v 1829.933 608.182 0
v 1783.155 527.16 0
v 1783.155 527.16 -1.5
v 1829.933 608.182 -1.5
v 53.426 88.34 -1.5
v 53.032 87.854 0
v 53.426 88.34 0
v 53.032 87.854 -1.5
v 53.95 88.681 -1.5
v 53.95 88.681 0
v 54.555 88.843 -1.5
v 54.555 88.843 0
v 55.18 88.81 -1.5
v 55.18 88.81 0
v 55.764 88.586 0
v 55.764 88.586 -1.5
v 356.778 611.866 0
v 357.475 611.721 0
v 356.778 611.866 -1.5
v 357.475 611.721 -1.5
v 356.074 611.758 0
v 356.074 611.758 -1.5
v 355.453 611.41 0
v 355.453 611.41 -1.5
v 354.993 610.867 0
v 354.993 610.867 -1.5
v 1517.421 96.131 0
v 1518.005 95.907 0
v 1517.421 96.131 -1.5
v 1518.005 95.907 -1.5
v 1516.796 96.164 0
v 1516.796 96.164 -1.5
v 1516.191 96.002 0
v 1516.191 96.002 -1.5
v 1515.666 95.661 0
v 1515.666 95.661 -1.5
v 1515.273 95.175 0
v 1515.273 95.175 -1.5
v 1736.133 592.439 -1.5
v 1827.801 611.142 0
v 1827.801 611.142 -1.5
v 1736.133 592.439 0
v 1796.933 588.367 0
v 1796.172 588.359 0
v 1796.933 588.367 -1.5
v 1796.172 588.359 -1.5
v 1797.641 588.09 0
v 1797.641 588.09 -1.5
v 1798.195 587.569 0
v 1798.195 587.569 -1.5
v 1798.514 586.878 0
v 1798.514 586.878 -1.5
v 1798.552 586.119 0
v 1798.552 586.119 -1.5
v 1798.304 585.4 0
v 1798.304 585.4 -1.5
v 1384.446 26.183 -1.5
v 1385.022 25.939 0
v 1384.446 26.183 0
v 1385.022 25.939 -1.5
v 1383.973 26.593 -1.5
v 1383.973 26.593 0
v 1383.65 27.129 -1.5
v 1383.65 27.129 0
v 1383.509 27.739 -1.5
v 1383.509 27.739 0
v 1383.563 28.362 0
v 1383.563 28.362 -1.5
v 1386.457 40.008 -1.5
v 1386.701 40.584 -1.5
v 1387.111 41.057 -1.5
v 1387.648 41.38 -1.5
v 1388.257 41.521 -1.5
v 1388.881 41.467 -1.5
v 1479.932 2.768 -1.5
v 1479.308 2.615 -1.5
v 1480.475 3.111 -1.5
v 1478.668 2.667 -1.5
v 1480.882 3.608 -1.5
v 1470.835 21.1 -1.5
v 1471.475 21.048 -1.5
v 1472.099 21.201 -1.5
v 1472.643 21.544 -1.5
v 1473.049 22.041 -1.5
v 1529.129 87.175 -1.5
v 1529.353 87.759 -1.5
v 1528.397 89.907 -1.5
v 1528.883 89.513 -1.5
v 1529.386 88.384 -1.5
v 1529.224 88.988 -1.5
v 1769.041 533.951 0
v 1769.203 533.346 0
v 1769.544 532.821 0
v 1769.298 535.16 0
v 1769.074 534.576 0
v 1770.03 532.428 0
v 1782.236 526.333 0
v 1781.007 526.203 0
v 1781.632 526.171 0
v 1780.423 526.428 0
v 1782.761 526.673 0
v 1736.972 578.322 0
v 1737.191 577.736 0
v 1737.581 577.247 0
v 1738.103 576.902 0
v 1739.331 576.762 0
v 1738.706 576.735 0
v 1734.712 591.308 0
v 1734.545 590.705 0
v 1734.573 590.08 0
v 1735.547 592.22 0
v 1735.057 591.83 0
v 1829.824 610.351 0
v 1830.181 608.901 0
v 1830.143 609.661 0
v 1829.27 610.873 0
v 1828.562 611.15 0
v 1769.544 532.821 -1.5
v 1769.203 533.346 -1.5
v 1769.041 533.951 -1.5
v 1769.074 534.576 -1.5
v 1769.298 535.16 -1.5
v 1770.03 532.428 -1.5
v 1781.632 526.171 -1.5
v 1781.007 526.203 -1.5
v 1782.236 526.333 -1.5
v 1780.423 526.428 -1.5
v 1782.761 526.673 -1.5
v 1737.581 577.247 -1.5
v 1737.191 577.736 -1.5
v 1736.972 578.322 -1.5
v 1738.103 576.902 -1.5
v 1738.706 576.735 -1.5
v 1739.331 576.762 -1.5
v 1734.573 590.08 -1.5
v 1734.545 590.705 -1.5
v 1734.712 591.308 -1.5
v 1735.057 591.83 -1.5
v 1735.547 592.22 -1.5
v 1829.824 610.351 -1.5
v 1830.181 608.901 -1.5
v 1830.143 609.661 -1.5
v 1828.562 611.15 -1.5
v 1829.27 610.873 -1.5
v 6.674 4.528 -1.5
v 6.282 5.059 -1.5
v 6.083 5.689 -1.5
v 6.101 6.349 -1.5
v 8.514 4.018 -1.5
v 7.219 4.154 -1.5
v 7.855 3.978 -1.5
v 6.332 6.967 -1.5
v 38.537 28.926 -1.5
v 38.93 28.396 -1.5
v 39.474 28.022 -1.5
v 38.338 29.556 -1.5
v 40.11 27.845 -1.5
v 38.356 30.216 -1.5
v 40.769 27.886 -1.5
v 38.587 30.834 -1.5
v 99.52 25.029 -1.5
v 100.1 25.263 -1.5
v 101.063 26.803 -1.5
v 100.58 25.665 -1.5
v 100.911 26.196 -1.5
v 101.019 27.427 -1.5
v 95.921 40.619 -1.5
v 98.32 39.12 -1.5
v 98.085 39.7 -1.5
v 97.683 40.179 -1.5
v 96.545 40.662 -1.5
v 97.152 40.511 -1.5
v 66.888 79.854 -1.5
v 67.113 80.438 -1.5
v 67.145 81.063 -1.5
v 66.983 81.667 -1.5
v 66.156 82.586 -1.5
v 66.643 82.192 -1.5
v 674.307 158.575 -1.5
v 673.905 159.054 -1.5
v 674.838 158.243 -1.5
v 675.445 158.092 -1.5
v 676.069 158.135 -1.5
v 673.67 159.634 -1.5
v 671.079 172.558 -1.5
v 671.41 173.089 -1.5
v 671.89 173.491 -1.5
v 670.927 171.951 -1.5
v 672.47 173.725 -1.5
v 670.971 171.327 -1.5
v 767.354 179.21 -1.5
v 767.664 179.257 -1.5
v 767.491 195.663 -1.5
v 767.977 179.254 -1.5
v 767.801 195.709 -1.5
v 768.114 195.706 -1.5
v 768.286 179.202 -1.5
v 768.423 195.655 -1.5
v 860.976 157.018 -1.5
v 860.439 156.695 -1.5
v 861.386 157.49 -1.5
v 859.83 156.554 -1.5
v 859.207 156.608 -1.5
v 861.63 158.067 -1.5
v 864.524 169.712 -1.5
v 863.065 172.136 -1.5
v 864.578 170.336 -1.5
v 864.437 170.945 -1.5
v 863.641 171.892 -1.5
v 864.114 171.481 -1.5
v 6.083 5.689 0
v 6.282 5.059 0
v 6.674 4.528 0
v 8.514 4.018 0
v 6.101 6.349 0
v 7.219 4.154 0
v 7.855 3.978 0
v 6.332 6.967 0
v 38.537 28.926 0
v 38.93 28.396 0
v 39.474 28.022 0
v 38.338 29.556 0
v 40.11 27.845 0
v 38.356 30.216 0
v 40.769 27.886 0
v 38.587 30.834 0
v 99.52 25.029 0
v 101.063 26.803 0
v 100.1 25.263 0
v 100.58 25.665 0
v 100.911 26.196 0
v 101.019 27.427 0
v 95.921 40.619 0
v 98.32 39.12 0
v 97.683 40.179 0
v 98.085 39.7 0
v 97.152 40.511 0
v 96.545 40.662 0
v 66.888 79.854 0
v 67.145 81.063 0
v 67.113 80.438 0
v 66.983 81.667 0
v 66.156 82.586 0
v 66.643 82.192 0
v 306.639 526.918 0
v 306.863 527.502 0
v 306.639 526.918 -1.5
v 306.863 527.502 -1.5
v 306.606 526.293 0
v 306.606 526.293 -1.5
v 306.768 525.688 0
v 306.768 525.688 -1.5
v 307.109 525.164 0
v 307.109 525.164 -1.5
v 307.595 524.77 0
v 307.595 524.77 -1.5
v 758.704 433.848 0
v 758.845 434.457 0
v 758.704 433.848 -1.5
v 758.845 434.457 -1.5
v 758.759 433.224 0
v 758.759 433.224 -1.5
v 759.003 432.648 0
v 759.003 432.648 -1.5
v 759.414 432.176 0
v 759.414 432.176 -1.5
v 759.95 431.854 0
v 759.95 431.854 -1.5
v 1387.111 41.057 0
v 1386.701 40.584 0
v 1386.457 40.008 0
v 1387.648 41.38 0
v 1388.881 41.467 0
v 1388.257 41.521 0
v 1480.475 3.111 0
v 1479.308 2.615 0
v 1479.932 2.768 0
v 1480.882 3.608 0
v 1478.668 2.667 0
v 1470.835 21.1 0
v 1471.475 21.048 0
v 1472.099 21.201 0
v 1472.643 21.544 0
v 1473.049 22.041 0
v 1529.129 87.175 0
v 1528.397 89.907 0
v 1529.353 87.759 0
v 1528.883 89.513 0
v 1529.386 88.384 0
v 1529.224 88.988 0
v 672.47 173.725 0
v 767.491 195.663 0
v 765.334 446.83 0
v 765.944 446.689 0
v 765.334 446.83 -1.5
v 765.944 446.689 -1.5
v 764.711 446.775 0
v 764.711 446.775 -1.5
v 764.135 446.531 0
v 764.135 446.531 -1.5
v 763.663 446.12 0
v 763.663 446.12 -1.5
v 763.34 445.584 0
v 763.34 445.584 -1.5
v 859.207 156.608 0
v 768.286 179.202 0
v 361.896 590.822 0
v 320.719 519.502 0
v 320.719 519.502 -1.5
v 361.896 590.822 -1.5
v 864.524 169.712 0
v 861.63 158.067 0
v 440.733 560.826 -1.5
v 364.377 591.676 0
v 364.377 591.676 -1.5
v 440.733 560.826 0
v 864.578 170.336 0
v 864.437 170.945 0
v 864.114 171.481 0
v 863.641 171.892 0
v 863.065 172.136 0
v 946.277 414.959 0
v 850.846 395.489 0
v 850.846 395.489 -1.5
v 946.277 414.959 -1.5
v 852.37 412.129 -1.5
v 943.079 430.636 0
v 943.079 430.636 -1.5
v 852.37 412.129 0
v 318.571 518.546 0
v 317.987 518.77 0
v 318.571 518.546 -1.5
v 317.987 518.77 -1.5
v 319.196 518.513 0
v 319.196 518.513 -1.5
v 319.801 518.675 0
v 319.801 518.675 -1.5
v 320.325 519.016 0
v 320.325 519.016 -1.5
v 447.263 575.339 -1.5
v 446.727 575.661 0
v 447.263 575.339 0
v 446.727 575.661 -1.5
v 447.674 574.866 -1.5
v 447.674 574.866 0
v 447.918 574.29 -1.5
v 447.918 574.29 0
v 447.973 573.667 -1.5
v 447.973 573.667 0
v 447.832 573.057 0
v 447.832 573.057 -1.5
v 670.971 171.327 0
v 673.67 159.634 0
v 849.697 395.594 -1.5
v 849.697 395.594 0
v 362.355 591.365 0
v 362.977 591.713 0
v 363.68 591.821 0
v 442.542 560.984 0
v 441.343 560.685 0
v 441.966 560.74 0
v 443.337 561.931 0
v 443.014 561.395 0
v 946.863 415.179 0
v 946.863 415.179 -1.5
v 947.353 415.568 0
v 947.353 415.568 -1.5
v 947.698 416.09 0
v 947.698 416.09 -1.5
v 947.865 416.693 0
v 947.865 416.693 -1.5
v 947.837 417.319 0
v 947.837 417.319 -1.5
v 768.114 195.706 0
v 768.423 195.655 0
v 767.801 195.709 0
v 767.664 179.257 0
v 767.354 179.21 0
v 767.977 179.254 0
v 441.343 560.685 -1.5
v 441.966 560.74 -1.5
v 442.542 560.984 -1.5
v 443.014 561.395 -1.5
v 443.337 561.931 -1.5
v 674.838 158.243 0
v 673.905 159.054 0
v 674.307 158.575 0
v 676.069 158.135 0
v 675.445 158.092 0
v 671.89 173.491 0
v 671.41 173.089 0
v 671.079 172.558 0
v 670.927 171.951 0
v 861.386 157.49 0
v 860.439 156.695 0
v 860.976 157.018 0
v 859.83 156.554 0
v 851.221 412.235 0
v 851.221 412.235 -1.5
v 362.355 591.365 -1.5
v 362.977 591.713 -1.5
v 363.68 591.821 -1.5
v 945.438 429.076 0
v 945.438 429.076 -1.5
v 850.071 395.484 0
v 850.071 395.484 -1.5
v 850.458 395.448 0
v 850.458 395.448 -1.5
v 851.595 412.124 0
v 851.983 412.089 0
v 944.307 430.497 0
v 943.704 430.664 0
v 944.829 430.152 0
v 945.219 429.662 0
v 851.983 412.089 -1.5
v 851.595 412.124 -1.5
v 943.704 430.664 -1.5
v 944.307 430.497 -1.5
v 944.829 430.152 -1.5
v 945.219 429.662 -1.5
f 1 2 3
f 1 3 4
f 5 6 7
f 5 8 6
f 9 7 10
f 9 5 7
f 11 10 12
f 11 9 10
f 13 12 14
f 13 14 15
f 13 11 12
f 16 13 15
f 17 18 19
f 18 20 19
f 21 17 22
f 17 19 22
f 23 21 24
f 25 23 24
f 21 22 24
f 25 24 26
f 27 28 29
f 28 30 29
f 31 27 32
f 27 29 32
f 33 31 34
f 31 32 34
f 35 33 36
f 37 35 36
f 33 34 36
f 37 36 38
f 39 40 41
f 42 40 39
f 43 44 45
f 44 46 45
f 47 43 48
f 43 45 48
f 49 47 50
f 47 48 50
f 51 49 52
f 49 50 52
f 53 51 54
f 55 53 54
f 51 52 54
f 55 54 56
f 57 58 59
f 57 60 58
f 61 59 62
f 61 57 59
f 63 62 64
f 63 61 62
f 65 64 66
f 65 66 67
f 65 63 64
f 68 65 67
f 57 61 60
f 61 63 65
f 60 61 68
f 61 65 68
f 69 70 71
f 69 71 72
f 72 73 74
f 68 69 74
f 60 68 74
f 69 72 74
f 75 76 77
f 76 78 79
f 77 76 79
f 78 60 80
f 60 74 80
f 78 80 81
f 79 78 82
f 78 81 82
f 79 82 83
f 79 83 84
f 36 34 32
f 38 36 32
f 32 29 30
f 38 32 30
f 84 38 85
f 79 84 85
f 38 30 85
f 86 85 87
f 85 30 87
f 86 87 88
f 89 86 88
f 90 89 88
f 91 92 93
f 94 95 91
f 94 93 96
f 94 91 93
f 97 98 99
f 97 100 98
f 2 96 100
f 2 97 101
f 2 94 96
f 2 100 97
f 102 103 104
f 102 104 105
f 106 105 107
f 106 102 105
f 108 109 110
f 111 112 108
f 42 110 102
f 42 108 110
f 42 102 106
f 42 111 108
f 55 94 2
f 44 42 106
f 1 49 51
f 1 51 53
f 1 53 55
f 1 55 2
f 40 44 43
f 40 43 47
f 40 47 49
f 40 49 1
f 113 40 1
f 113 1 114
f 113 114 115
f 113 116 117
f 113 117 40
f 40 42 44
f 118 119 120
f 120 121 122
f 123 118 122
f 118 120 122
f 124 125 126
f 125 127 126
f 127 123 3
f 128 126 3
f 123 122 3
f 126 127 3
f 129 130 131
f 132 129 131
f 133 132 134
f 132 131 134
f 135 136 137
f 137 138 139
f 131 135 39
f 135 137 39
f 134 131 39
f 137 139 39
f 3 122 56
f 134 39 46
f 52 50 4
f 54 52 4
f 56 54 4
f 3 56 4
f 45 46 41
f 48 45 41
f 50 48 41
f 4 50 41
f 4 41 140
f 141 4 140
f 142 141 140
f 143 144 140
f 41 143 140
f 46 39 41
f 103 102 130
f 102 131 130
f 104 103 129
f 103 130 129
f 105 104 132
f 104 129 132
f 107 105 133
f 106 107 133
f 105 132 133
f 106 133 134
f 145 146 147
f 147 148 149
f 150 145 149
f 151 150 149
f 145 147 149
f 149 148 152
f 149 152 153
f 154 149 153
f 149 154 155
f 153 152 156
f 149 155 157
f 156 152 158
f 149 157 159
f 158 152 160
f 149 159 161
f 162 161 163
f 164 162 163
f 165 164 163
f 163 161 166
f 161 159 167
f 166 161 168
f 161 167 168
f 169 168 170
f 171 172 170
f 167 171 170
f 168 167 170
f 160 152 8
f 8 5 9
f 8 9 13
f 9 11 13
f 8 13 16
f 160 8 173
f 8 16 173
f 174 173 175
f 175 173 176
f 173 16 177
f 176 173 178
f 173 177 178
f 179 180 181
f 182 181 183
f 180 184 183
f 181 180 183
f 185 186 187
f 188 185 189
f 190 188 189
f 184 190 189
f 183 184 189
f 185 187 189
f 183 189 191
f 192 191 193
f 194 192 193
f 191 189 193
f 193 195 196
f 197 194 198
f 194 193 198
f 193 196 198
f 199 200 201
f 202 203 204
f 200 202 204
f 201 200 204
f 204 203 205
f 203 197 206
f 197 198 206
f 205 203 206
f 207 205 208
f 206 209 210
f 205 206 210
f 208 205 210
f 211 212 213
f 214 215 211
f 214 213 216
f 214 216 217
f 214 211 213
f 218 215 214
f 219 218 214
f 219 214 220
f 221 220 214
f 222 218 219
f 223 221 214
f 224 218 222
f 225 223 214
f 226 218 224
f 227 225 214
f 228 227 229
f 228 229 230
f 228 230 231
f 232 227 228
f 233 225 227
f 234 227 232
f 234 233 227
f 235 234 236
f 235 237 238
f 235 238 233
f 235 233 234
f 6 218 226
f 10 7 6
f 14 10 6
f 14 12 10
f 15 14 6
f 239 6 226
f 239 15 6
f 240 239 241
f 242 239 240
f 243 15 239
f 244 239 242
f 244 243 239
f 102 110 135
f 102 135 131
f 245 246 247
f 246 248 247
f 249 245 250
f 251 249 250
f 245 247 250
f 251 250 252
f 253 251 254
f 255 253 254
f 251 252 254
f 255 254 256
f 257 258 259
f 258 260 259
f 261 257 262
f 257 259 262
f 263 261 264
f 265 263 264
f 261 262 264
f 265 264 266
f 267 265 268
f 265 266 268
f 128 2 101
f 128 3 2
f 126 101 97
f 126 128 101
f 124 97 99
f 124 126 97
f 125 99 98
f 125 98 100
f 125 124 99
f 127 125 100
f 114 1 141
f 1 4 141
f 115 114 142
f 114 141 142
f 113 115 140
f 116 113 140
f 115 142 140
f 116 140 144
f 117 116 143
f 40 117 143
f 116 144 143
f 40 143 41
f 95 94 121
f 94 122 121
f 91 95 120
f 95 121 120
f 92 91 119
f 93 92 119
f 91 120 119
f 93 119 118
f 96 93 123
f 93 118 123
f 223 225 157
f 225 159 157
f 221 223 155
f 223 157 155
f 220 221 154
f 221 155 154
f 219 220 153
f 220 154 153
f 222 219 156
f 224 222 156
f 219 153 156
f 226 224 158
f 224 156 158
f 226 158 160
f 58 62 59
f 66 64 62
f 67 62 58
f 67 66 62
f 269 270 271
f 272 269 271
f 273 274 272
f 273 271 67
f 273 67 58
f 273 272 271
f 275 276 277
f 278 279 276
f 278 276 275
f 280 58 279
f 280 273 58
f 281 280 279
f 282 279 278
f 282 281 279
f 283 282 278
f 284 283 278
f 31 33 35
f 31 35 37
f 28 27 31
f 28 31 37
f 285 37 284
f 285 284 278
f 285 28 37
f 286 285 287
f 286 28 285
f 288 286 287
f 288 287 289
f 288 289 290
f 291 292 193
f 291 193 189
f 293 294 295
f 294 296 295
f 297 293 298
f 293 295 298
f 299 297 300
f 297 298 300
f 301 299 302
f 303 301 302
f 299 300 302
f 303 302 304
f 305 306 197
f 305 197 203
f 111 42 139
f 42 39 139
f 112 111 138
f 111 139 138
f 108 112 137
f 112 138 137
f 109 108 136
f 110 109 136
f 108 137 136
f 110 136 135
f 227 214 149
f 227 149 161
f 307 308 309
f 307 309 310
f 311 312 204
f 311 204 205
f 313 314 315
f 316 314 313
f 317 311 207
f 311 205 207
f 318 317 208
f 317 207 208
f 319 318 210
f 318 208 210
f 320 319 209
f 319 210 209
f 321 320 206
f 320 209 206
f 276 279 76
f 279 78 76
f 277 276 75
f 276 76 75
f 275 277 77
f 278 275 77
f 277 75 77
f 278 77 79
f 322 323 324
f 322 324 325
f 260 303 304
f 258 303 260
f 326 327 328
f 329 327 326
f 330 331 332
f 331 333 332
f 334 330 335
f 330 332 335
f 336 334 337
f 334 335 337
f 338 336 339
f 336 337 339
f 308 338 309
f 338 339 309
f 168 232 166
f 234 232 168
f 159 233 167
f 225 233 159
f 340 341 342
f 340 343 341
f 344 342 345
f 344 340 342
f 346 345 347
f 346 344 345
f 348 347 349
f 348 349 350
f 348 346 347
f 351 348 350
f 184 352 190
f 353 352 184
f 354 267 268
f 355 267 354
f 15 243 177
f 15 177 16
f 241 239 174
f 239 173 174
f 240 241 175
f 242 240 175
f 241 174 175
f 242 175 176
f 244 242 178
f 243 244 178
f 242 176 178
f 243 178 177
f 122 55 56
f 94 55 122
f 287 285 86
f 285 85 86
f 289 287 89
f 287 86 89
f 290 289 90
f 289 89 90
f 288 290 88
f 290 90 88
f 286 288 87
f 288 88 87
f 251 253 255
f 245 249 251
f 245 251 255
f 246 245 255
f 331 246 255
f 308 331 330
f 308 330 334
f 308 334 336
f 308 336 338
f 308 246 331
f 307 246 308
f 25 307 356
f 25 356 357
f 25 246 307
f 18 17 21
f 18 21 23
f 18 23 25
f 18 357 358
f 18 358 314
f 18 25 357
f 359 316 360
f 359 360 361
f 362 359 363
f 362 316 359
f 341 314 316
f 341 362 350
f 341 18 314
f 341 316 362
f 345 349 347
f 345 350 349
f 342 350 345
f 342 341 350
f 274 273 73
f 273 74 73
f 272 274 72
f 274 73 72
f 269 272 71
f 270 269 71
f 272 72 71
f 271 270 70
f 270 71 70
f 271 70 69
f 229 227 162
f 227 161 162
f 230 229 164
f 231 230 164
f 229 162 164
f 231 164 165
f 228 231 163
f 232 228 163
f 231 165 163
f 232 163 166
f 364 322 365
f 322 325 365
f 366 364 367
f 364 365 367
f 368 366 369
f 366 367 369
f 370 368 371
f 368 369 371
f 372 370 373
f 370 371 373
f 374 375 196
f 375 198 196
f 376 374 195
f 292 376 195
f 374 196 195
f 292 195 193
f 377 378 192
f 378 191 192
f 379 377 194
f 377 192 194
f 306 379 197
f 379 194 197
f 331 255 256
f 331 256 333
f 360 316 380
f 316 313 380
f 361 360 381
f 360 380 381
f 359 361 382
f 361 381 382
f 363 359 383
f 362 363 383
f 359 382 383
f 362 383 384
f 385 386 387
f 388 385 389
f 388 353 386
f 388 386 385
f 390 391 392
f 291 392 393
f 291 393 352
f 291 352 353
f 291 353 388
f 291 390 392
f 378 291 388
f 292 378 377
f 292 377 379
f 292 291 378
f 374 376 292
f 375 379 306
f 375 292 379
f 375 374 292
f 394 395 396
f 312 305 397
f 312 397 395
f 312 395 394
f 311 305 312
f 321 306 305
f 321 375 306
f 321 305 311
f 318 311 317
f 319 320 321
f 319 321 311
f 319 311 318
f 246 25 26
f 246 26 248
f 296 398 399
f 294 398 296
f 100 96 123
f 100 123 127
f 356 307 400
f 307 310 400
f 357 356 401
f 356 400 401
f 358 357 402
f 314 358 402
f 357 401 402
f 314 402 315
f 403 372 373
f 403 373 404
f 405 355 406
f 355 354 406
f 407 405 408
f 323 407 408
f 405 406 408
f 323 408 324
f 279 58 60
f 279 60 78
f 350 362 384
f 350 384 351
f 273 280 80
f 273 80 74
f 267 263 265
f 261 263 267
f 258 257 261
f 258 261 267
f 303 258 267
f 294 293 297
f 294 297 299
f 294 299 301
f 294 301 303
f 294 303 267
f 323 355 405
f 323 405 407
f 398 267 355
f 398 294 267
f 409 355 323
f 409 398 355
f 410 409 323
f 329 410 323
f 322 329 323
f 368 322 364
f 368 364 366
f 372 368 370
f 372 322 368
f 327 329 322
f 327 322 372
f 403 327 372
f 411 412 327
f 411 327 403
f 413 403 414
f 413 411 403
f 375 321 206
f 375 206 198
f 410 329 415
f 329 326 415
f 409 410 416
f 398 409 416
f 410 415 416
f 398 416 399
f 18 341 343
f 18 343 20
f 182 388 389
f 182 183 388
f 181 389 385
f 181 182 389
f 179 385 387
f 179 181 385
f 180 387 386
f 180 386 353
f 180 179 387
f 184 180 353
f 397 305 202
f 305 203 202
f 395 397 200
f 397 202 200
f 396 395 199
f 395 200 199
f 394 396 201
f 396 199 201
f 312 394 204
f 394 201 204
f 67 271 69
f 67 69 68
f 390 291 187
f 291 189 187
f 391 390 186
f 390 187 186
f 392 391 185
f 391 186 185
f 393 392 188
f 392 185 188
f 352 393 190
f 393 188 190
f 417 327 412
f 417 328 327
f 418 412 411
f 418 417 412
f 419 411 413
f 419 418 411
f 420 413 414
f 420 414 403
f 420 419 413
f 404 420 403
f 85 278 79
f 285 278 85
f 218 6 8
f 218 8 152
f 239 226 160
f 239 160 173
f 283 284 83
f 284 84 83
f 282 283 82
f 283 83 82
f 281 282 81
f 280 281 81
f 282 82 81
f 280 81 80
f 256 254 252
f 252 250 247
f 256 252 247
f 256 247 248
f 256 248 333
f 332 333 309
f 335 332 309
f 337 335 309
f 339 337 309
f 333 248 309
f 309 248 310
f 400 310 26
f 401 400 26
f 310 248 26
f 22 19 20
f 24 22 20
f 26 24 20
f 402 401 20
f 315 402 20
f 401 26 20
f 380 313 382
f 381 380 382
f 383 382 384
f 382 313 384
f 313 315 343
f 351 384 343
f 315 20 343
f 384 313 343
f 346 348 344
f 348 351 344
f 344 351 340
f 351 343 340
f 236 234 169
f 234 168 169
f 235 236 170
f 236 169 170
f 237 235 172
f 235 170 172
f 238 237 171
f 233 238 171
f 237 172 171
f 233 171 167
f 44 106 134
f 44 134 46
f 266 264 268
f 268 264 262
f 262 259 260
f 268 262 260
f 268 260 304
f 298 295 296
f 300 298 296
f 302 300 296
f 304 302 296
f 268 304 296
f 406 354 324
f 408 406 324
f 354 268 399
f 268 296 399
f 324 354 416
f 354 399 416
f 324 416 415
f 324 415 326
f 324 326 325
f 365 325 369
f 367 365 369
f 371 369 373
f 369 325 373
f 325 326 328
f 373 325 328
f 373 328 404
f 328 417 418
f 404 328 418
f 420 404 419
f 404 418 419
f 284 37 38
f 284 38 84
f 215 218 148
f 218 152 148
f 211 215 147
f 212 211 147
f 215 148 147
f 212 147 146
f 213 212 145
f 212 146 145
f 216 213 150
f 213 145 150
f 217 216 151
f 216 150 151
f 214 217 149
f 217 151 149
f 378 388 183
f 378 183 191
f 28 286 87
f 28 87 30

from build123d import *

# Parameters (mm, degrees)
F2_DEPTH = 1.5
F3_R     = 2
F4_R     = 2
F5_R     = 2
F6_R     = 2
F7_R     = 2
F8_R     = 2


with BuildPart() as f2:
    # F1 (on Top) → F2 (new body)
    with BuildSketch(Plane.XY):
        Polygon((674.120196, 157.685518), (767.820764, 179.317999), (861.147472, 156.125625), (865.006224, 171.653343), (767.957986, 195.770545), (670.520979, 173.275439), align=None)
        Polygon((448.58115, 574.911729), (355.862764, 612.372388), (305.862764, 525.769848), (319.719171, 517.769848), (362.764877, 592.327198), (442.587444, 560.076787), align=None)
        Polygon((945.038517, 431.035937), (851.779991, 412.008822), (764.089526, 447.43807), (758.09582, 432.603128), (850.255548, 395.368181), (948.237032, 415.358899), align=None)
        Polygon((54.031893, 89.585985), (4.031893, 2.983444), (101.4689, 25.47855), (97.869683, 41.068471), (36.28704, 26.850997), (67.8883, 81.585985), align=None)
        Polygon((1782.154563, 525.427659), (1832.154563, 612.030199), (1734.173079, 592.039482), (1737.371594, 576.362444), (1800.525758, 589.247502), (1768.298157, 533.427659), align=None)
        Polygon((1383.080823, 26.421346), (1480.129062, 2.304145), (1530.129062, 88.906685), (1516.272655, 96.906685), (1472.296243, 20.737305), (1386.939575, 41.949065), align=None)
    extrude(amount=-F2_DEPTH)

    # F3
    f3_edges = [f2.edges().sort_by_distance(p)[0] for p in [
        (355.862764, 612.372388, -0.75),
        (448.58115, 574.911729, -0.75),
        (442.587444, 560.076787, -0.75),
        (362.764877, 592.327198, -0.75),
        (319.719171, 517.769848, -0.75),
        (305.862764, 525.769848, -0.75),
    ]]
    fillet(f3_edges, radius=F3_R)

    # F4
    f4_edges = [f2.edges().sort_by_distance(p)[0] for p in [
        (764.089526, 447.43807, -0.75),
        (758.09582, 432.603128, -0.75),
        (851.779991, 412.008822, -0.75),
        (945.038517, 431.035937, -0.75),
        (948.237032, 415.358899, -0.75),
        (850.255548, 395.368181, -0.75),
    ]]
    fillet(f4_edges, radius=F4_R)

    # F5
    f5_edges = [f2.edges().sort_by_distance(p)[0] for p in [
        (1734.173079, 592.039482, -0.75),
        (1737.371594, 576.362444, -0.75),
        (1768.298157, 533.427659, -0.75),
        (1782.154563, 525.427659, -0.75),
        (1800.525758, 589.247502, -0.75),
        (1832.154563, 612.030199, -0.75),
    ]]
    fillet(f5_edges, radius=F5_R)

    # F6
    f6_edges = [f2.edges().sort_by_distance(p)[0] for p in [
        (1386.939575, 41.949065, -0.75),
        (1383.080823, 26.421346, -0.75),
        (1472.296243, 20.737305, -0.75),
        (1480.129062, 2.304145, -0.75),
        (1516.272655, 96.906685, -0.75),
        (1530.129062, 88.906685, -0.75),
    ]]
    fillet(f6_edges, radius=F6_R)

    # F7
    f7_edges = [f2.edges().sort_by_distance(p)[0] for p in [
        (674.120196, 157.685518, -0.75),
        (670.520979, 173.275439, -0.75),
        (767.820764, 179.317999, -0.75),
        (861.147472, 156.125625, -0.75),
        (865.006224, 171.653343, -0.75),
        (767.957986, 195.770545, -0.75),
    ]]
    fillet(f7_edges, radius=F7_R)

    # F8
    f8_edges = [f2.edges().sort_by_distance(p)[0] for p in [
        (101.4689, 25.47855, -0.75),
        (97.869683, 41.068471, -0.75),
        (4.031893, 2.983444, -0.75),
        (54.031893, 89.585985, -0.75),
        (67.8883, 81.585985, -0.75),
        (36.28704, 26.850997, -0.75),
    ]]
    fillet(f8_edges, radius=F8_R)


solid = f2.part
